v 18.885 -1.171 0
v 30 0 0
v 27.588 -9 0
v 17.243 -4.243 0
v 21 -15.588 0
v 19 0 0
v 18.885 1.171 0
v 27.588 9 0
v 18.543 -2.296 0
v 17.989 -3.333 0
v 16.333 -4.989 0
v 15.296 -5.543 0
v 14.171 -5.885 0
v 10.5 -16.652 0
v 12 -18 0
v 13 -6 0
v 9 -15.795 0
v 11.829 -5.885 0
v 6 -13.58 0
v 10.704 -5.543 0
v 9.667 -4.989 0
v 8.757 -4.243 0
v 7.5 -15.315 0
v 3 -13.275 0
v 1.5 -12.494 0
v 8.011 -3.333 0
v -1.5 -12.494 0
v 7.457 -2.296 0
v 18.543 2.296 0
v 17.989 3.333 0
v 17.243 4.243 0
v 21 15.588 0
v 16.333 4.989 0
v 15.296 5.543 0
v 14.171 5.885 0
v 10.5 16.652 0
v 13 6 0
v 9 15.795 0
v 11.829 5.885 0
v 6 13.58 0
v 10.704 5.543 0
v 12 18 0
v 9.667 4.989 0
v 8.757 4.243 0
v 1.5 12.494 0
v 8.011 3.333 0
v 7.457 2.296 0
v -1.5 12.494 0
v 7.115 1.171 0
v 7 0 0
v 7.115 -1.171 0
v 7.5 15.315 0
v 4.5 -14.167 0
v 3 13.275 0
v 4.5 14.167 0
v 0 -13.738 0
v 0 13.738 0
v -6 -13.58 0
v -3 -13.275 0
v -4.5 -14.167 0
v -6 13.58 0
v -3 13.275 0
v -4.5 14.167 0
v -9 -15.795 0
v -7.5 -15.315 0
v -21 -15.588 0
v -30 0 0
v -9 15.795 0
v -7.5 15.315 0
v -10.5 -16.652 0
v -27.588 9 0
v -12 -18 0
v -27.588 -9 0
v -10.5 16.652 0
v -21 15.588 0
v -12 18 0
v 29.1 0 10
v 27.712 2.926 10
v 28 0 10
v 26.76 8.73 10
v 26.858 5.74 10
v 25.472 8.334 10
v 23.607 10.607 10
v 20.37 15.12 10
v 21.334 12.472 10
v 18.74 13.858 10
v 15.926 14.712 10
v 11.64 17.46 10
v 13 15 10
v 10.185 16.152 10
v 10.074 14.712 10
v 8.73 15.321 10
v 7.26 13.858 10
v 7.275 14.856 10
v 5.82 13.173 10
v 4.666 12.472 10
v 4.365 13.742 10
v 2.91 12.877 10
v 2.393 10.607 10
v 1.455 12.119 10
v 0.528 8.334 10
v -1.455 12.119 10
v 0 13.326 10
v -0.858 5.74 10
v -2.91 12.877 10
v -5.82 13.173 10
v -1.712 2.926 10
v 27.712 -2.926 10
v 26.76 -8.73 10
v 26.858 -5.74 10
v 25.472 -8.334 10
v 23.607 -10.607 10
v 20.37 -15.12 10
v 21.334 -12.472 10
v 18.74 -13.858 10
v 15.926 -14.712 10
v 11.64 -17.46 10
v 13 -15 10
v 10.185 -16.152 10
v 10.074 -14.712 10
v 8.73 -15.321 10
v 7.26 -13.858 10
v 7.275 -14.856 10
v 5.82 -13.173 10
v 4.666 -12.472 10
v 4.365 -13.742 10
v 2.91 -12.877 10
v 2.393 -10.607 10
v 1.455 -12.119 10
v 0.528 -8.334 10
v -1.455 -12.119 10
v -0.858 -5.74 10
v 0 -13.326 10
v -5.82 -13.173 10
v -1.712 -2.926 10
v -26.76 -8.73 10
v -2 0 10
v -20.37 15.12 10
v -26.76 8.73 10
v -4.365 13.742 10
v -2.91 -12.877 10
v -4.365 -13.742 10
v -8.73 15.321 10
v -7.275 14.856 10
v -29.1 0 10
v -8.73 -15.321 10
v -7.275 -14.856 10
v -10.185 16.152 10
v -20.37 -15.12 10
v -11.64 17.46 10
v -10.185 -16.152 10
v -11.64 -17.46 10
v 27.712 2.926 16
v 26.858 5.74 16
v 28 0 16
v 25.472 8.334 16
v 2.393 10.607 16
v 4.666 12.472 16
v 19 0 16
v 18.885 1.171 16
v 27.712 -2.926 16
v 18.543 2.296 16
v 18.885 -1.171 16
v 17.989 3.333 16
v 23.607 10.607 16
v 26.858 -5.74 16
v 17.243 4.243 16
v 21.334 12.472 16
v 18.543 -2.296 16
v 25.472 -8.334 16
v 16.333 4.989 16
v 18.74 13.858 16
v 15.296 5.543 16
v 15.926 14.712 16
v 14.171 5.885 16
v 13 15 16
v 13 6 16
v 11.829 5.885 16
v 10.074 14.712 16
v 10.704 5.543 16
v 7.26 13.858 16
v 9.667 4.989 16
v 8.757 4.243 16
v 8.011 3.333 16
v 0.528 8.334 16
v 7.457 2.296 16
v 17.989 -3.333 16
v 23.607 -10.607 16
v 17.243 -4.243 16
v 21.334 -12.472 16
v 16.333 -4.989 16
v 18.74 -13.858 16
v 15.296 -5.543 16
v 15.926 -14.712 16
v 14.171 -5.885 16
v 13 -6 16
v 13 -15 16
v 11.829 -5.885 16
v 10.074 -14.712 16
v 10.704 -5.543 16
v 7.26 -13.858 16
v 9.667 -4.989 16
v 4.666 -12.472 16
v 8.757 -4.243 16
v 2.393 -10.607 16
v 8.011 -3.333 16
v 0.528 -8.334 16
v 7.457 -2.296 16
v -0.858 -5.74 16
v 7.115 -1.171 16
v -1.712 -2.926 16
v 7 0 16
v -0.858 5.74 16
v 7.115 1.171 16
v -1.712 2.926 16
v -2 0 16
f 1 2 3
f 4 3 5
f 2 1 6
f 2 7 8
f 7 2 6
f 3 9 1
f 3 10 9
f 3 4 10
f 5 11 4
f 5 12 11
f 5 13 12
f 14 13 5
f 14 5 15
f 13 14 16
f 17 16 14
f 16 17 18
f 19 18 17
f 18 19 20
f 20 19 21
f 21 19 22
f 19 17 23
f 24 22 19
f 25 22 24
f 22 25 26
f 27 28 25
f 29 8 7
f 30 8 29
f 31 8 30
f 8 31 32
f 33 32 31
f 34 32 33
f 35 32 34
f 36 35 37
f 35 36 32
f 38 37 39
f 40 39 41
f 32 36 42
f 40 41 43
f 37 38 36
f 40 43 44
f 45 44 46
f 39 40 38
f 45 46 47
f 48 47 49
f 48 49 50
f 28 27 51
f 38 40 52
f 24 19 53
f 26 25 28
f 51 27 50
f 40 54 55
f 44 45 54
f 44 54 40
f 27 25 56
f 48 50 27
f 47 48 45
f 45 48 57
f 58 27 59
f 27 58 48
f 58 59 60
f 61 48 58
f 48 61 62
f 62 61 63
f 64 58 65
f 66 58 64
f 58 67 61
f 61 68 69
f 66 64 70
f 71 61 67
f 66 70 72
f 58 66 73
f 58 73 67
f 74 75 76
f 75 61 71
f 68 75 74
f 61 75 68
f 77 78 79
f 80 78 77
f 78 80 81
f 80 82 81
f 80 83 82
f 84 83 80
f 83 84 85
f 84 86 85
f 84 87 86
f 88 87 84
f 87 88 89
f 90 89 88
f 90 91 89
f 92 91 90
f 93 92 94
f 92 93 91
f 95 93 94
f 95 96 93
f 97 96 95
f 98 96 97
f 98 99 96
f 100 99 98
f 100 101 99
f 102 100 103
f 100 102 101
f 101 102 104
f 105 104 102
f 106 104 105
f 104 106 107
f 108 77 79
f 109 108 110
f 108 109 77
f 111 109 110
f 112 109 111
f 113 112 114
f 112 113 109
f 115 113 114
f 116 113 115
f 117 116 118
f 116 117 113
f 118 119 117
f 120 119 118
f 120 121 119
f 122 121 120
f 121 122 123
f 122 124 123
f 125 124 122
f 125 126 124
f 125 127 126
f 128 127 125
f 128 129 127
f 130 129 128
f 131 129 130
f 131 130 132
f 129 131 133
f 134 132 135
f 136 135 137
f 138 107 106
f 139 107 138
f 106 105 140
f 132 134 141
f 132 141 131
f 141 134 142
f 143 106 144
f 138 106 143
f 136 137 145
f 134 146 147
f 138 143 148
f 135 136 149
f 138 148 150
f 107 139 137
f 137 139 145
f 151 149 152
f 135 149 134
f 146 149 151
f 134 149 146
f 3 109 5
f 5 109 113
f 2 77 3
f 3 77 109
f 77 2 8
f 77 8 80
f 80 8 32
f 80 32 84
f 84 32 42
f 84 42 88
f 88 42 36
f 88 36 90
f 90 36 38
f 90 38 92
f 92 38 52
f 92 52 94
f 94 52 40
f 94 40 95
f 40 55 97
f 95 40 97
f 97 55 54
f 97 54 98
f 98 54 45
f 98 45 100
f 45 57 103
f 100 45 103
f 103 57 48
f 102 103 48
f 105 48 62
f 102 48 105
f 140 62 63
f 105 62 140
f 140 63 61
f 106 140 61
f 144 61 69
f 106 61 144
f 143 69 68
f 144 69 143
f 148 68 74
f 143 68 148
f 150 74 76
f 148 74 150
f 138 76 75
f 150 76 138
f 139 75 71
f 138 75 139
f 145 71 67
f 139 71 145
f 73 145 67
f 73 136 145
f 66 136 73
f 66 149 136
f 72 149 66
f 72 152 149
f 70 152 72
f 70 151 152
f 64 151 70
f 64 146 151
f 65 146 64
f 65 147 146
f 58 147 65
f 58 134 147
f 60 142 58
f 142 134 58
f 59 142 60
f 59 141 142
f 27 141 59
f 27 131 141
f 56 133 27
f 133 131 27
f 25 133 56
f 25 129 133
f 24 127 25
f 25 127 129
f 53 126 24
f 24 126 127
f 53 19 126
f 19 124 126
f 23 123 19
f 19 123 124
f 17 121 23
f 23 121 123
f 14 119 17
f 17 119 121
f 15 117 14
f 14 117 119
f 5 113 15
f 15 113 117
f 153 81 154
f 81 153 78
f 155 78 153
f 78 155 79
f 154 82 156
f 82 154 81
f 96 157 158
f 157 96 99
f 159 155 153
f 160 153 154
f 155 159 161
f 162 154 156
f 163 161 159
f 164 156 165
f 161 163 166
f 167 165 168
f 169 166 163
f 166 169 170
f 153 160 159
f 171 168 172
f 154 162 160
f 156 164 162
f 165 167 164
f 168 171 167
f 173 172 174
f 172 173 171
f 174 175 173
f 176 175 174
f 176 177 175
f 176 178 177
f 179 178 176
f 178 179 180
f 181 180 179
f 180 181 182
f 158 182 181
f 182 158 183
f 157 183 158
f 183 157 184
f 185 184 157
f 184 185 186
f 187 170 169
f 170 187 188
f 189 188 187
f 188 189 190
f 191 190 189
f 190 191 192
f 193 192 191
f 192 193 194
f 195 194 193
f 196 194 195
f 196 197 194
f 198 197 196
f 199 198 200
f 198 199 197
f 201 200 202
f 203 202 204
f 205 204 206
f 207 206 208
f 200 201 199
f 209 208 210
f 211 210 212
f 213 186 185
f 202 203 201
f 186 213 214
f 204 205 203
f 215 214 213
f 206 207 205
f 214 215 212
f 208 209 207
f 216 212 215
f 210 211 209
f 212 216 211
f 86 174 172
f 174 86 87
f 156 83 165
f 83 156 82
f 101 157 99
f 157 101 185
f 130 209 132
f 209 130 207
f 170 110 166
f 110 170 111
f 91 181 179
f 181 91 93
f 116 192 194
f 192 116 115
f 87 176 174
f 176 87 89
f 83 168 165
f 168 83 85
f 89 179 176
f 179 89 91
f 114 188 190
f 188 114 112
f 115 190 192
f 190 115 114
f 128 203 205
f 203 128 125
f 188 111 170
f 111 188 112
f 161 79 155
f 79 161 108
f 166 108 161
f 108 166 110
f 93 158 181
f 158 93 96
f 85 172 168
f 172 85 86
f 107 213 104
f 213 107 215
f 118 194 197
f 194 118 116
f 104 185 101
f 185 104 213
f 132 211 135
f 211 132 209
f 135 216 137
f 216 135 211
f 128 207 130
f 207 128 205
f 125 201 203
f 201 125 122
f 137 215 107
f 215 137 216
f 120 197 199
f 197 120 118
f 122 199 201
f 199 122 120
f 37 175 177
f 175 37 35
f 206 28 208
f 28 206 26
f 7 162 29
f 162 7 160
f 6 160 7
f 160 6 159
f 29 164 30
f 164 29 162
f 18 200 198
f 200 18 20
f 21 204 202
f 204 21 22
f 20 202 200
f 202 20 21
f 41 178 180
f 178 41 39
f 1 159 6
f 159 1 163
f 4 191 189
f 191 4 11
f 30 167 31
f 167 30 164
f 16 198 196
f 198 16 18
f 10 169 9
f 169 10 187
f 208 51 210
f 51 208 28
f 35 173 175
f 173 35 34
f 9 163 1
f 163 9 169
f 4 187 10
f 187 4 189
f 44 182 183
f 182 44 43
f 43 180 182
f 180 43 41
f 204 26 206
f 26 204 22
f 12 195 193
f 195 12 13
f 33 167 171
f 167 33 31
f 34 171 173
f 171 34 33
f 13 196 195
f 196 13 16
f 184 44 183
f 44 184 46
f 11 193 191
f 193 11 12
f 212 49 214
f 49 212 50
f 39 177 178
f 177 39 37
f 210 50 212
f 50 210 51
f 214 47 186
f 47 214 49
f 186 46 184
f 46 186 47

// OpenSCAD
$fn = 32;

// ----------------------------------------------------------------------
// Handle: 60 x 36 mm grip, 10 mm thick
// ----------------------------------------------------------------------

// --- parameters (mm) ---
length = 60;              // grip length
width = 36;               // grip width
thickness = 10;           // grip thickness
waist = 0.72;             // width factor at the middle
draft = 0.97;             // top face scale of the extrusion
scallops = 6;             // finger rests per side
ripple = 0.06;            // depth factor of the finger rests
boss_d = 30;              // mounting boss diameter
boss_h = 6;               // mounting boss height
boss_hole_d = 12;         // screw clearance through the boss
boss_r = 13;              // boss centre from the grip centre

/* ergonomic grip outline, closed spline-like polygon in the XY plane */
grip = [[-12, 18], [-10.5, 16.652], [-9, 15.795], [-7.5, 15.315], [-6, 13.58], [-4.5, 14.167], [-3, 13.275], [-1.5, 12.494], [0, 13.738], [1.5, 12.494], [3, 13.275], [4.5, 14.167], [6, 13.58], [7.5, 15.315], [9, 15.795], [10.5, 16.652], [12, 18], [21, 15.588], [27.588, 9], [30, 0], [27.588, -9], [21, -15.588], [12, -18], [12, -18], [10.5, -16.652], [9, -15.795], [7.5, -15.315], [6, -13.58], [4.5, -14.167], [3, -13.275], [1.5, -12.494], [0, -13.738], [-1.5, -12.494], [-3, -13.275], [-4.5, -14.167], [-6, -13.58], [-7.5, -15.315], [-9, -15.795], [-10.5, -16.652], [-12, -18], [-21, -15.588], [-27.588, -9], [-30, 0], [-27.588, 9], [-21, 15.588], [-12, 18]];

module grip_body() {
  linear_extrude(height = thickness, scale = draft) polygon(grip);
}

module boss_body() {
  /* sunk 1 mm into the grip so the joint overlaps */
  translate([boss_r, 0, thickness - 1]) cylinder(h = boss_h + 1, d = boss_d);
}

difference() {
  union() {
    grip_body();
    boss_body();
  }
  translate([boss_r, 0, -1]) cylinder(h = thickness + boss_h + 2, d = boss_hole_d);
}
